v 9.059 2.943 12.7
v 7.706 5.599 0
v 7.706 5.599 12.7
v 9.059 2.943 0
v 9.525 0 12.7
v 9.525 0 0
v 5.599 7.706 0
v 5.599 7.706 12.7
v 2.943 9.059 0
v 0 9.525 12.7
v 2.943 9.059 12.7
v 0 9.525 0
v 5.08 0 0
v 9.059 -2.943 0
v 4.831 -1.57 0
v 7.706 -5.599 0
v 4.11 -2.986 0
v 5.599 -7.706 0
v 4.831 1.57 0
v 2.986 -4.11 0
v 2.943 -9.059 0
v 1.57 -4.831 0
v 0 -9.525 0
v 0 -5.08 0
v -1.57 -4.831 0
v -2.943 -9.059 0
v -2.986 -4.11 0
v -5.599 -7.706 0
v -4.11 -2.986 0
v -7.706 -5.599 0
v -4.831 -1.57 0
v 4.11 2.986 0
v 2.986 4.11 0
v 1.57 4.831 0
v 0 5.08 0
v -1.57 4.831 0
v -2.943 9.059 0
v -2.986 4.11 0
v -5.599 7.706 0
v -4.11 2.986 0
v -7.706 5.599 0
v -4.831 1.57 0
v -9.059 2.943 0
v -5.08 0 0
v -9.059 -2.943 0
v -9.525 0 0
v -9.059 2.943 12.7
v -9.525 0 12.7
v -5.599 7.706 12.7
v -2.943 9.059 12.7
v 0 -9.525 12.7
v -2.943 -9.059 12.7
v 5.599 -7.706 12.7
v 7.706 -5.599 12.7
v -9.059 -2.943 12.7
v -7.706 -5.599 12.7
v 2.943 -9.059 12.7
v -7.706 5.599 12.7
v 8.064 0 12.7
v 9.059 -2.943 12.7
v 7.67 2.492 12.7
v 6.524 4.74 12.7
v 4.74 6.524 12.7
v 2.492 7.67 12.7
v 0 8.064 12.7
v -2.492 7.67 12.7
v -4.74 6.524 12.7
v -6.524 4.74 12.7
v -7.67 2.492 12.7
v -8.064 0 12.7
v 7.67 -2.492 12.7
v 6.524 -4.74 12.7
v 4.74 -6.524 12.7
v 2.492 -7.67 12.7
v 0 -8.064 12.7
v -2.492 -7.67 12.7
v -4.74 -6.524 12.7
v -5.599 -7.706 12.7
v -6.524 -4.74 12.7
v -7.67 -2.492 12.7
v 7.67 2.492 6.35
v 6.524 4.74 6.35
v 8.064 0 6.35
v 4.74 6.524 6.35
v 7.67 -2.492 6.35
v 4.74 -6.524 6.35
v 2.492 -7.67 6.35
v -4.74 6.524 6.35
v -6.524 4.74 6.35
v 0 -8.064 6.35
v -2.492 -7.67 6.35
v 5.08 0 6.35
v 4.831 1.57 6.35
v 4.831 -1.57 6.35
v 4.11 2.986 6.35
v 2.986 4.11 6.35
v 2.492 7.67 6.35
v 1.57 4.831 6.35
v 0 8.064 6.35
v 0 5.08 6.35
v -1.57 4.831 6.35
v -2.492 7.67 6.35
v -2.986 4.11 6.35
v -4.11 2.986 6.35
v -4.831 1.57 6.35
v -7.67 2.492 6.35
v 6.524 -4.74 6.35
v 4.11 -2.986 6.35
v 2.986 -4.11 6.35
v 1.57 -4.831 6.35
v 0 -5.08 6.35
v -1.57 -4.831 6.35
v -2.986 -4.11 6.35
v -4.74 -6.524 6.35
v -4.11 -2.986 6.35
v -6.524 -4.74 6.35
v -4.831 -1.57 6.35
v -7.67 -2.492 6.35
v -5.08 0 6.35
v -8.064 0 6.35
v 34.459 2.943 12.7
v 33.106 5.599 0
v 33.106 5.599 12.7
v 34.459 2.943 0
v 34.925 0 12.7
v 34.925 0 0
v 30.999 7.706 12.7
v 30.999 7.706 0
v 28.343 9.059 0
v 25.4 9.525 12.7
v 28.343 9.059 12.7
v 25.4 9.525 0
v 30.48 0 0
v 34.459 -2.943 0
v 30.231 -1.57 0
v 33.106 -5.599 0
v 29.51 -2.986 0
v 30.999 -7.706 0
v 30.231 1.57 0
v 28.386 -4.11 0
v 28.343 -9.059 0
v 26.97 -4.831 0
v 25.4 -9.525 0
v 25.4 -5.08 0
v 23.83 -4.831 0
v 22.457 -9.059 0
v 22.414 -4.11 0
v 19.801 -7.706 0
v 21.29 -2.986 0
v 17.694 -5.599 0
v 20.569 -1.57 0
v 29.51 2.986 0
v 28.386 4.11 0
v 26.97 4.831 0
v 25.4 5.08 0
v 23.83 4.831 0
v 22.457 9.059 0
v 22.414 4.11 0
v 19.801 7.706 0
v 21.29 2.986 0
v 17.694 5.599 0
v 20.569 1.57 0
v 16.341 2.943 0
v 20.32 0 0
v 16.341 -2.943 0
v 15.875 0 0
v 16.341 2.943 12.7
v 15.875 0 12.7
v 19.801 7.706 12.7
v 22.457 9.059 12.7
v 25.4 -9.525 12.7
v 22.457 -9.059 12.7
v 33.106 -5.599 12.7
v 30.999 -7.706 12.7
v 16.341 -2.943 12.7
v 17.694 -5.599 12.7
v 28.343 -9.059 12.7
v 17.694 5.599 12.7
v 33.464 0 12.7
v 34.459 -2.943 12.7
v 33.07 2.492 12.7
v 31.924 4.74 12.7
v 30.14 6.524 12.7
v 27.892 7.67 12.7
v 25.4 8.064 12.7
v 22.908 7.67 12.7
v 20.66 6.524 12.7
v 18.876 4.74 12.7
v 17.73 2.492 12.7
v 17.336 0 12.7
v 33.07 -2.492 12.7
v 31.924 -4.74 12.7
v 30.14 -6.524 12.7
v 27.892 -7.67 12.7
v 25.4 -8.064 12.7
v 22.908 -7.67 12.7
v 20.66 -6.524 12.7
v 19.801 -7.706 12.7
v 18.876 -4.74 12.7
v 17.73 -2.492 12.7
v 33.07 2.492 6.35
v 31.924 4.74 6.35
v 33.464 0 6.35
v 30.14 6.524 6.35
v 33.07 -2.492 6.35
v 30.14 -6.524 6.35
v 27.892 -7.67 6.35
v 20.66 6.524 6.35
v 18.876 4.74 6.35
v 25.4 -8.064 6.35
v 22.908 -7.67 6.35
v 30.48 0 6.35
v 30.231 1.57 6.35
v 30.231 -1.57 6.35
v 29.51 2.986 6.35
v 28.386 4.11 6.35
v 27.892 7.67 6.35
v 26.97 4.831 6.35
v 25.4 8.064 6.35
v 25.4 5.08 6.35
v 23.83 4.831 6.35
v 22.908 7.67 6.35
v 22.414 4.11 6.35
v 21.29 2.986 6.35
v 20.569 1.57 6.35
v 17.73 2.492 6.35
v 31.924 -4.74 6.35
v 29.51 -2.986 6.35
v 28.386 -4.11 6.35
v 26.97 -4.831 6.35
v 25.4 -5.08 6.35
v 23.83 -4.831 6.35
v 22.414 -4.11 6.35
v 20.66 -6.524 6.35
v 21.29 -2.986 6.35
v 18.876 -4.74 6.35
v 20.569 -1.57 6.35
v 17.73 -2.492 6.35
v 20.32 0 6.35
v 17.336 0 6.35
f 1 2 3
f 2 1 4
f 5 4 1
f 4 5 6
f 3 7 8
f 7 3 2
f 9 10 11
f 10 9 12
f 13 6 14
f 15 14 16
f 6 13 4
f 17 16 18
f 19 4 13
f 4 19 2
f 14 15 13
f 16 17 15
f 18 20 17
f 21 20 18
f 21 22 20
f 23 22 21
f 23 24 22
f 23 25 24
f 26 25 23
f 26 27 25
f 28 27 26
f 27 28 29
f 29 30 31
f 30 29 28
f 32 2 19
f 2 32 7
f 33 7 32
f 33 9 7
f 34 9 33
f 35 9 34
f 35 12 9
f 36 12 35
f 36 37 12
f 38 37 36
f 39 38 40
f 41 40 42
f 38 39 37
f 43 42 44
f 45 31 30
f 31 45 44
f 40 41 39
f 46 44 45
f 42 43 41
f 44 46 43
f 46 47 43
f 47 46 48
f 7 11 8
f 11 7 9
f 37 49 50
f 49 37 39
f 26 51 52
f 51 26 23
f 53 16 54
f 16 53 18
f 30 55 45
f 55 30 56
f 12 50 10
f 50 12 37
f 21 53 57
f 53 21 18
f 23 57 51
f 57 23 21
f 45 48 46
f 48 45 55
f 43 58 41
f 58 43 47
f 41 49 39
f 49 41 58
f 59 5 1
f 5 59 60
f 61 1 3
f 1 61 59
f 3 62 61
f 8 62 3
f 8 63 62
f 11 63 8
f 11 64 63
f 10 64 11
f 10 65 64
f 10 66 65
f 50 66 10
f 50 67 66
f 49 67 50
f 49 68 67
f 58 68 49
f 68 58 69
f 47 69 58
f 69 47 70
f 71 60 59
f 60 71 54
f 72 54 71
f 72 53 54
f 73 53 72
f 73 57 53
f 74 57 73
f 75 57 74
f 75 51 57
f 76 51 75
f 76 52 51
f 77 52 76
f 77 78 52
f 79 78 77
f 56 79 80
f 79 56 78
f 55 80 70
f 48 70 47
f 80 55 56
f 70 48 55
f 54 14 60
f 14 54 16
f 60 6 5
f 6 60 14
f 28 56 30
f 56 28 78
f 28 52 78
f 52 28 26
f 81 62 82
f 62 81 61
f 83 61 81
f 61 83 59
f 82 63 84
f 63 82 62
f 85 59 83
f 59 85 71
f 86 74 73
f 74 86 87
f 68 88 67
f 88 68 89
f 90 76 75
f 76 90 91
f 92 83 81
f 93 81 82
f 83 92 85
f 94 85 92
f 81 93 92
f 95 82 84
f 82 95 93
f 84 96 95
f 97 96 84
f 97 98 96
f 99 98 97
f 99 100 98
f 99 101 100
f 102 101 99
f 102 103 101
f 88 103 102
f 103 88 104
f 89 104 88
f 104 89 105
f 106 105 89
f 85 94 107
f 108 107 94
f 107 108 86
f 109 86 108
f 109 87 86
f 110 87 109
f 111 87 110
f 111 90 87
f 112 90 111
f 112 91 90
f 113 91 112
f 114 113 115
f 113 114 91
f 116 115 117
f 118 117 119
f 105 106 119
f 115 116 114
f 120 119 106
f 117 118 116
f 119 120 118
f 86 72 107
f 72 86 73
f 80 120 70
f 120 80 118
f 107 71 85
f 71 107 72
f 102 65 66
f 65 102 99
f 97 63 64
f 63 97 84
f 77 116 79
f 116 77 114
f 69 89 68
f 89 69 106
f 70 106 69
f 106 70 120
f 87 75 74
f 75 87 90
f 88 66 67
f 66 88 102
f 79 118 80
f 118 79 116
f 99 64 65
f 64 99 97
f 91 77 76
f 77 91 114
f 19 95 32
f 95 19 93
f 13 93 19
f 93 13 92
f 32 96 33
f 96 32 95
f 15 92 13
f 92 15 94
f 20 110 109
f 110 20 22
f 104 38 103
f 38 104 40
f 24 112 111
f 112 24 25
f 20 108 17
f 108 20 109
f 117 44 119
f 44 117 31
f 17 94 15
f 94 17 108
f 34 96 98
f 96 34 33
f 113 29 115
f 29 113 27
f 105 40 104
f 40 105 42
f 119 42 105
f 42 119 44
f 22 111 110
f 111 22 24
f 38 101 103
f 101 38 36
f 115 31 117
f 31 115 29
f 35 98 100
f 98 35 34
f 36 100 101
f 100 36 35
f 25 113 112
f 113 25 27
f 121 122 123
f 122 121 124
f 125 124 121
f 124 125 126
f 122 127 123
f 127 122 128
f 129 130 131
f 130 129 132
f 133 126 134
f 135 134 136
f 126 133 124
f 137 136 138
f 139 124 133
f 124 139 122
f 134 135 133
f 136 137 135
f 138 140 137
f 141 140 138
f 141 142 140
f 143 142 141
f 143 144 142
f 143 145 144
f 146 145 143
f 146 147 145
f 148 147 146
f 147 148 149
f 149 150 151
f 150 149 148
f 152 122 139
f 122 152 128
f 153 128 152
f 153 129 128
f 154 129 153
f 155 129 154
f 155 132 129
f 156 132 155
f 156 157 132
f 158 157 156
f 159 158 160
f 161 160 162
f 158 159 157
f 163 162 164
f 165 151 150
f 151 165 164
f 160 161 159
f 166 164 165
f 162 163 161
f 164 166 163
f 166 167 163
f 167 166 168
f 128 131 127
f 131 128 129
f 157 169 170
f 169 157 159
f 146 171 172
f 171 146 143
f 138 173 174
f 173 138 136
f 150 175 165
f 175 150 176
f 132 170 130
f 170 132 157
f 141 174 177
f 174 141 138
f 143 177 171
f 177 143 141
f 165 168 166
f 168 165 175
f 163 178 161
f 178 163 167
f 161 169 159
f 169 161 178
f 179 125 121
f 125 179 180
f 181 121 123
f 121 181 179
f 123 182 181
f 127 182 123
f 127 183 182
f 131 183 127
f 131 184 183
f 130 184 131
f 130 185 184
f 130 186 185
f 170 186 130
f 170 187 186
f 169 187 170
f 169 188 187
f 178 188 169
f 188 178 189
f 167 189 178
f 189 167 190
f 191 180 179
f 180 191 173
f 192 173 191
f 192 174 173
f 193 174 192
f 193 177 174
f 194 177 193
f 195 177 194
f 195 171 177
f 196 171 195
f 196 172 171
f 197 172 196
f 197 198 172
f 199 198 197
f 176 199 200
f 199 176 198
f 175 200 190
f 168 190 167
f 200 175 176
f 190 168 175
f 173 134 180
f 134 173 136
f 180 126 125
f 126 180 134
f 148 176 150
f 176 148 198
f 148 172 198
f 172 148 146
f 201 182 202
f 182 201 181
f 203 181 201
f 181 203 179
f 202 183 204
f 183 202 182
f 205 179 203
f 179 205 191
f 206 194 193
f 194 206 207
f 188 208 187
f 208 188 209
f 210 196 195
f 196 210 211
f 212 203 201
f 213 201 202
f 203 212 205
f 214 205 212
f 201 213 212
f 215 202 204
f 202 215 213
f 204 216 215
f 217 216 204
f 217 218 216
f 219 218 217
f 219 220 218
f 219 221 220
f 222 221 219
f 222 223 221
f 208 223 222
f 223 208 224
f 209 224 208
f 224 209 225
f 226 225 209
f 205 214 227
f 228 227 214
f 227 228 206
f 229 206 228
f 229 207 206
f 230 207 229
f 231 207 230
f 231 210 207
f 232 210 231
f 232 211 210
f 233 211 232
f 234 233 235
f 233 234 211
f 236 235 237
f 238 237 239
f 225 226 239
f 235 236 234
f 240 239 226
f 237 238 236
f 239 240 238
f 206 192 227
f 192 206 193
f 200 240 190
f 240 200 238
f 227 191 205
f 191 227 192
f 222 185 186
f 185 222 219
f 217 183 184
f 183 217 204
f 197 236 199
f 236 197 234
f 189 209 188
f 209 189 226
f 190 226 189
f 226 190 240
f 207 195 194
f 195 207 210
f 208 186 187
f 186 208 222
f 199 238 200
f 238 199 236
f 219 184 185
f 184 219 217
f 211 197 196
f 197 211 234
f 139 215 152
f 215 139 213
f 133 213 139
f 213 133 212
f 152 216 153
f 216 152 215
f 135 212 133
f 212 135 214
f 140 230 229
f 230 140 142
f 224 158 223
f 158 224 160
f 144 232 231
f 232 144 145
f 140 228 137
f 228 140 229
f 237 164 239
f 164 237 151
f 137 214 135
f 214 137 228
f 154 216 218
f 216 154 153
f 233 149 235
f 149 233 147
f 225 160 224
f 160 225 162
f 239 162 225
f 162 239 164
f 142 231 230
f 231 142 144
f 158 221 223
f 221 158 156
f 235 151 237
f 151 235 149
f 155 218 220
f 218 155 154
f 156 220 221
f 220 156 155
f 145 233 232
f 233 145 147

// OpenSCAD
module spring_socket(length=1/2, od=3/4, major_id=.635, minor_id=0.4, $fn=20) {
  difference() {
    cylinder(r=od/2, h=length);

    translate([0,0,length/2])
    cylinder(r=major_id/2, h=2);

    translate([0,0,-0.1])
    cylinder(r=minor_id/2, h=2);
  }
}

scale([25.4, 25.4, 25.4]) {
  spring_socket();
  
  translate([1,0,0])
  spring_socket();
}
